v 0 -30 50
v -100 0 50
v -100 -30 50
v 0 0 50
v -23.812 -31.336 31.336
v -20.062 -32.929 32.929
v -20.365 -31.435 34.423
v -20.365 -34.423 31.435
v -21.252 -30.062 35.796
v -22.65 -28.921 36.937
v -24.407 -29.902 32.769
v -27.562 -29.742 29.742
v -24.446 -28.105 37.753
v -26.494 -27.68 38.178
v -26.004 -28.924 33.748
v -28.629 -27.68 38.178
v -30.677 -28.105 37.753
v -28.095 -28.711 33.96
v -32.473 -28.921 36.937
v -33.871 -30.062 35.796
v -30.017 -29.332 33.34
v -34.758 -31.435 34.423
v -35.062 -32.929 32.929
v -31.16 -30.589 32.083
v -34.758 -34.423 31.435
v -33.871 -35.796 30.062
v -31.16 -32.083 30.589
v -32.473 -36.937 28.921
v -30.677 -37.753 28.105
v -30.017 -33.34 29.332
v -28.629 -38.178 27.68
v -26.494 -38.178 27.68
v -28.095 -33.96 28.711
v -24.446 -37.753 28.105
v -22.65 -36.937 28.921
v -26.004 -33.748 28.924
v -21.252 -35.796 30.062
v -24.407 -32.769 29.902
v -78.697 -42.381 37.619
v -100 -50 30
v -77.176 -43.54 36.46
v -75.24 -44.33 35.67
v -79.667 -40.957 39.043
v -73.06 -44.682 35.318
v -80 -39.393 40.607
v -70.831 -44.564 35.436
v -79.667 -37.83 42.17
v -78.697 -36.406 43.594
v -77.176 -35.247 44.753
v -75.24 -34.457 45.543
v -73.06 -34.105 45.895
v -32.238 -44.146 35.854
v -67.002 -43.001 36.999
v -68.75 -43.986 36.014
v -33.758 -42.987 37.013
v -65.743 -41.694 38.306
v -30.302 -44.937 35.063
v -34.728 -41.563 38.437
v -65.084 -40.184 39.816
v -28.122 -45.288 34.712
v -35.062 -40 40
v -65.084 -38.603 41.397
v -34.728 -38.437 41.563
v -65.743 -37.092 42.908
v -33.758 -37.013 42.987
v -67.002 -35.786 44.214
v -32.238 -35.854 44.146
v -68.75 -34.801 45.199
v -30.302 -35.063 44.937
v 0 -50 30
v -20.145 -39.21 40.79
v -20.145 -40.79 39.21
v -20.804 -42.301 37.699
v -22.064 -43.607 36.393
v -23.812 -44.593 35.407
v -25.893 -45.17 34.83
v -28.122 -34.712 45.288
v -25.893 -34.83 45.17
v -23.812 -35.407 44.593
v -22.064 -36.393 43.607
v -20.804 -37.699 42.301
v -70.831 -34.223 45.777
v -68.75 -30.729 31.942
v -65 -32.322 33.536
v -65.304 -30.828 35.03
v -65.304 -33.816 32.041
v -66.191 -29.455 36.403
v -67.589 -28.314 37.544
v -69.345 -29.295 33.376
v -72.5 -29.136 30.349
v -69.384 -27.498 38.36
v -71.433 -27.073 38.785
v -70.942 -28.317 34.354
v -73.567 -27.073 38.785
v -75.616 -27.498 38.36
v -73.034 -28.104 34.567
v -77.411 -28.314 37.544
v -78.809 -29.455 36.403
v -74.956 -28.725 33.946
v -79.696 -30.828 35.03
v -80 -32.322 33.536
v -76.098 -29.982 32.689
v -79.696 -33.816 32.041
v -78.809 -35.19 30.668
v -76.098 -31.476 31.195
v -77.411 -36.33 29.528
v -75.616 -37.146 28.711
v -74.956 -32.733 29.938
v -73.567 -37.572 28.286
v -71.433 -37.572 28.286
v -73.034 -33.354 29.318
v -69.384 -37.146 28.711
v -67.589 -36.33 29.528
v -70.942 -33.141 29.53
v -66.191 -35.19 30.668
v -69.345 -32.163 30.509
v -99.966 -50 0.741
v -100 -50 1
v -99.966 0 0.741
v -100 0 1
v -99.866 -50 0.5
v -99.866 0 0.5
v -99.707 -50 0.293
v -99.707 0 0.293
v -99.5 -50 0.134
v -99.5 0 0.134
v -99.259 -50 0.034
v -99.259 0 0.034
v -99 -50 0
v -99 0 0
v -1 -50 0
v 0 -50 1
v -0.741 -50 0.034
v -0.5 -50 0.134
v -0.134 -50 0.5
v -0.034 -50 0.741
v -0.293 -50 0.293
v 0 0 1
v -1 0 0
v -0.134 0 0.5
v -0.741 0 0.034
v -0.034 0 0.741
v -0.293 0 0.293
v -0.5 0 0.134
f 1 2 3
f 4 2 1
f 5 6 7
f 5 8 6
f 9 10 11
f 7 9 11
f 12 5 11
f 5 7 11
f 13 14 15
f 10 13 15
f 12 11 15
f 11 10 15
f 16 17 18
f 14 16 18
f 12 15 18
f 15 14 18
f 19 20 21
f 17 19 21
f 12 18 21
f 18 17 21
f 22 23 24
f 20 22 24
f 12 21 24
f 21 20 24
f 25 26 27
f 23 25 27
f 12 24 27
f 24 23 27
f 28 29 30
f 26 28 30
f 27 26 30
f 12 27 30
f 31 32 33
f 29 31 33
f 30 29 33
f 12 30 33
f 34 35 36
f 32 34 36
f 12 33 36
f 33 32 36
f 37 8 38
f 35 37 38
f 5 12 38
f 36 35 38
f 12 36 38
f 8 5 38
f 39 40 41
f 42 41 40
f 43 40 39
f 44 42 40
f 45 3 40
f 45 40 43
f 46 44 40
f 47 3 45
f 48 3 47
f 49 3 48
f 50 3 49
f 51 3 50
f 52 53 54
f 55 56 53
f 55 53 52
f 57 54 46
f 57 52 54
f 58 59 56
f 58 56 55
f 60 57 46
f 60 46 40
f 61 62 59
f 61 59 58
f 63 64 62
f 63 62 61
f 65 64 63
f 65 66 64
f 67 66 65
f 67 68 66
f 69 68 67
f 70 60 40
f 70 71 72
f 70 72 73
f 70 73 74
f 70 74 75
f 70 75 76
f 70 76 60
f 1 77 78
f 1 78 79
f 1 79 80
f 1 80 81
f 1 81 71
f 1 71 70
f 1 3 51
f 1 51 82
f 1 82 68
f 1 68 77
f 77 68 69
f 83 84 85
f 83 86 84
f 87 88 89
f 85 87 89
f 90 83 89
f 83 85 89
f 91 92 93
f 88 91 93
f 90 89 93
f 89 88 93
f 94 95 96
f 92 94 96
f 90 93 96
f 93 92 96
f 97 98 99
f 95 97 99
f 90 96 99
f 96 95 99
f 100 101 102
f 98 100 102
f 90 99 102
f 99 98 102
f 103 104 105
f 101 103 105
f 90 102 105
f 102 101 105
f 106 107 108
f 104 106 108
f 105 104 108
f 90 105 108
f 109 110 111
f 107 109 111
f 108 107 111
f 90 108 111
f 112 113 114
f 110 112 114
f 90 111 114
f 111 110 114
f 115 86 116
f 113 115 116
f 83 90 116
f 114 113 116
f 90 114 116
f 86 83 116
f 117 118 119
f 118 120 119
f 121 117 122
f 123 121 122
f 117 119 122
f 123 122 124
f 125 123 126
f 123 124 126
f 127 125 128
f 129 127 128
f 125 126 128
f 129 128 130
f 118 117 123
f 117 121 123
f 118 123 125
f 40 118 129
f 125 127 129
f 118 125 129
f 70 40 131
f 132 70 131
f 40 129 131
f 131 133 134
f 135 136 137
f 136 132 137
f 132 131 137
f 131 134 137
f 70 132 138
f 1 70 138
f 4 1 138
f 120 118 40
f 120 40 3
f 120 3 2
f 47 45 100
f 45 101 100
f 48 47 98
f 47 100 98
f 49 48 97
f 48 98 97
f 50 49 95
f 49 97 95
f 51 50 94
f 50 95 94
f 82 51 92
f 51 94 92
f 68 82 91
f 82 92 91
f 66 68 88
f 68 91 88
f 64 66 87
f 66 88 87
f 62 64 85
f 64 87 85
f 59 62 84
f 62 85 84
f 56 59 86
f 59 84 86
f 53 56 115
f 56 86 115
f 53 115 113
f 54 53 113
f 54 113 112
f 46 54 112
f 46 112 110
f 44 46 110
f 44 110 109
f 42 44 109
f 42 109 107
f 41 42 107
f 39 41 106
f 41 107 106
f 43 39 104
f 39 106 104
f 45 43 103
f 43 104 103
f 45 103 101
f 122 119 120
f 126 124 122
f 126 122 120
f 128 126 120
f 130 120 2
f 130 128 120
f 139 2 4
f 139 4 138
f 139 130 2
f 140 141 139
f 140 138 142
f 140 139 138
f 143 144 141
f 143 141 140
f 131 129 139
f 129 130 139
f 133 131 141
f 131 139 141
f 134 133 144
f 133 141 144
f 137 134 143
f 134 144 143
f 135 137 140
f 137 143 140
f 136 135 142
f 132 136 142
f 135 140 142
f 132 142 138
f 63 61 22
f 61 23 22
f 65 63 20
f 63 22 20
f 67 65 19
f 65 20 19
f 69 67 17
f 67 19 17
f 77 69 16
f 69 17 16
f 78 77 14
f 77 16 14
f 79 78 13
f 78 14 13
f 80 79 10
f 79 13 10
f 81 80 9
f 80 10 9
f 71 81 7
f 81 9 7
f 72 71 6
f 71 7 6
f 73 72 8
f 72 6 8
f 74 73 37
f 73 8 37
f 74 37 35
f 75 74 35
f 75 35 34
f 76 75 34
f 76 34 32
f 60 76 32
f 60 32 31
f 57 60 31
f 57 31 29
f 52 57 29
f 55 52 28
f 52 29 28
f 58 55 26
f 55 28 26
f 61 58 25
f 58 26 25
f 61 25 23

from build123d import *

# Parameters (mm, degrees)
F0_W     = 100
F0_H     = 50
F1_DEPTH = 50
F2_SIZE  = 20
F5_D     = 15
F5_DEPTH = 10
F5_TIP   = 4.5064546427
F6_D     = 15
F6_DEPTH = 10
F6_TIP   = 4.5064546427
F7_R     = 1


with BuildPart() as f1:
    # F0 (on Top) → F1 (new body)
    with BuildSketch(Plane.XY):
        with Locations((-50, -25)):
            Rectangle(F0_W, F0_H)
    extrude(amount=F1_DEPTH)

    # F2
    f2_edges = [f1.edges().sort_by_distance(p)[0] for p in [
        (-50, -50, 50),
    ]]
    chamfer(f2_edges, length=F2_SIZE)

    # F5
    with Locations(Plane(origin=(0, -40, 40), x_dir=(1, 0, 0), z_dir=(0, -0.7071067812, 0.7071067812))):
        with Locations((-27.5615938008, 0)):
            Hole(F5_D / 2, depth=F5_DEPTH)
            with Locations((0, 0, -(F5_DEPTH + F5_TIP / 2))):  # 118° drill point
                Cone(0, F5_D / 2, F5_TIP, mode=Mode.SUBTRACT)

    # F6
    with Locations(Plane(origin=(0, -40, 40), x_dir=(1, 0, 0), z_dir=(0, -0.7071067812, 0.7071067812))):
        with Locations((-72.5, 0.8578643763)):
            Hole(F6_D / 2, depth=F6_DEPTH)
            with Locations((0, 0, -(F6_DEPTH + F6_TIP / 2))):  # 118° drill point
                Cone(0, F6_D / 2, F6_TIP, mode=Mode.SUBTRACT)

    # F7
    f7_edges = [f1.edges().sort_by_distance(p)[0] for p in [
        (0, -25, 0),
        (-100, -25, 0),
    ]]
    fillet(f7_edges, radius=F7_R)


solid = f1.part
